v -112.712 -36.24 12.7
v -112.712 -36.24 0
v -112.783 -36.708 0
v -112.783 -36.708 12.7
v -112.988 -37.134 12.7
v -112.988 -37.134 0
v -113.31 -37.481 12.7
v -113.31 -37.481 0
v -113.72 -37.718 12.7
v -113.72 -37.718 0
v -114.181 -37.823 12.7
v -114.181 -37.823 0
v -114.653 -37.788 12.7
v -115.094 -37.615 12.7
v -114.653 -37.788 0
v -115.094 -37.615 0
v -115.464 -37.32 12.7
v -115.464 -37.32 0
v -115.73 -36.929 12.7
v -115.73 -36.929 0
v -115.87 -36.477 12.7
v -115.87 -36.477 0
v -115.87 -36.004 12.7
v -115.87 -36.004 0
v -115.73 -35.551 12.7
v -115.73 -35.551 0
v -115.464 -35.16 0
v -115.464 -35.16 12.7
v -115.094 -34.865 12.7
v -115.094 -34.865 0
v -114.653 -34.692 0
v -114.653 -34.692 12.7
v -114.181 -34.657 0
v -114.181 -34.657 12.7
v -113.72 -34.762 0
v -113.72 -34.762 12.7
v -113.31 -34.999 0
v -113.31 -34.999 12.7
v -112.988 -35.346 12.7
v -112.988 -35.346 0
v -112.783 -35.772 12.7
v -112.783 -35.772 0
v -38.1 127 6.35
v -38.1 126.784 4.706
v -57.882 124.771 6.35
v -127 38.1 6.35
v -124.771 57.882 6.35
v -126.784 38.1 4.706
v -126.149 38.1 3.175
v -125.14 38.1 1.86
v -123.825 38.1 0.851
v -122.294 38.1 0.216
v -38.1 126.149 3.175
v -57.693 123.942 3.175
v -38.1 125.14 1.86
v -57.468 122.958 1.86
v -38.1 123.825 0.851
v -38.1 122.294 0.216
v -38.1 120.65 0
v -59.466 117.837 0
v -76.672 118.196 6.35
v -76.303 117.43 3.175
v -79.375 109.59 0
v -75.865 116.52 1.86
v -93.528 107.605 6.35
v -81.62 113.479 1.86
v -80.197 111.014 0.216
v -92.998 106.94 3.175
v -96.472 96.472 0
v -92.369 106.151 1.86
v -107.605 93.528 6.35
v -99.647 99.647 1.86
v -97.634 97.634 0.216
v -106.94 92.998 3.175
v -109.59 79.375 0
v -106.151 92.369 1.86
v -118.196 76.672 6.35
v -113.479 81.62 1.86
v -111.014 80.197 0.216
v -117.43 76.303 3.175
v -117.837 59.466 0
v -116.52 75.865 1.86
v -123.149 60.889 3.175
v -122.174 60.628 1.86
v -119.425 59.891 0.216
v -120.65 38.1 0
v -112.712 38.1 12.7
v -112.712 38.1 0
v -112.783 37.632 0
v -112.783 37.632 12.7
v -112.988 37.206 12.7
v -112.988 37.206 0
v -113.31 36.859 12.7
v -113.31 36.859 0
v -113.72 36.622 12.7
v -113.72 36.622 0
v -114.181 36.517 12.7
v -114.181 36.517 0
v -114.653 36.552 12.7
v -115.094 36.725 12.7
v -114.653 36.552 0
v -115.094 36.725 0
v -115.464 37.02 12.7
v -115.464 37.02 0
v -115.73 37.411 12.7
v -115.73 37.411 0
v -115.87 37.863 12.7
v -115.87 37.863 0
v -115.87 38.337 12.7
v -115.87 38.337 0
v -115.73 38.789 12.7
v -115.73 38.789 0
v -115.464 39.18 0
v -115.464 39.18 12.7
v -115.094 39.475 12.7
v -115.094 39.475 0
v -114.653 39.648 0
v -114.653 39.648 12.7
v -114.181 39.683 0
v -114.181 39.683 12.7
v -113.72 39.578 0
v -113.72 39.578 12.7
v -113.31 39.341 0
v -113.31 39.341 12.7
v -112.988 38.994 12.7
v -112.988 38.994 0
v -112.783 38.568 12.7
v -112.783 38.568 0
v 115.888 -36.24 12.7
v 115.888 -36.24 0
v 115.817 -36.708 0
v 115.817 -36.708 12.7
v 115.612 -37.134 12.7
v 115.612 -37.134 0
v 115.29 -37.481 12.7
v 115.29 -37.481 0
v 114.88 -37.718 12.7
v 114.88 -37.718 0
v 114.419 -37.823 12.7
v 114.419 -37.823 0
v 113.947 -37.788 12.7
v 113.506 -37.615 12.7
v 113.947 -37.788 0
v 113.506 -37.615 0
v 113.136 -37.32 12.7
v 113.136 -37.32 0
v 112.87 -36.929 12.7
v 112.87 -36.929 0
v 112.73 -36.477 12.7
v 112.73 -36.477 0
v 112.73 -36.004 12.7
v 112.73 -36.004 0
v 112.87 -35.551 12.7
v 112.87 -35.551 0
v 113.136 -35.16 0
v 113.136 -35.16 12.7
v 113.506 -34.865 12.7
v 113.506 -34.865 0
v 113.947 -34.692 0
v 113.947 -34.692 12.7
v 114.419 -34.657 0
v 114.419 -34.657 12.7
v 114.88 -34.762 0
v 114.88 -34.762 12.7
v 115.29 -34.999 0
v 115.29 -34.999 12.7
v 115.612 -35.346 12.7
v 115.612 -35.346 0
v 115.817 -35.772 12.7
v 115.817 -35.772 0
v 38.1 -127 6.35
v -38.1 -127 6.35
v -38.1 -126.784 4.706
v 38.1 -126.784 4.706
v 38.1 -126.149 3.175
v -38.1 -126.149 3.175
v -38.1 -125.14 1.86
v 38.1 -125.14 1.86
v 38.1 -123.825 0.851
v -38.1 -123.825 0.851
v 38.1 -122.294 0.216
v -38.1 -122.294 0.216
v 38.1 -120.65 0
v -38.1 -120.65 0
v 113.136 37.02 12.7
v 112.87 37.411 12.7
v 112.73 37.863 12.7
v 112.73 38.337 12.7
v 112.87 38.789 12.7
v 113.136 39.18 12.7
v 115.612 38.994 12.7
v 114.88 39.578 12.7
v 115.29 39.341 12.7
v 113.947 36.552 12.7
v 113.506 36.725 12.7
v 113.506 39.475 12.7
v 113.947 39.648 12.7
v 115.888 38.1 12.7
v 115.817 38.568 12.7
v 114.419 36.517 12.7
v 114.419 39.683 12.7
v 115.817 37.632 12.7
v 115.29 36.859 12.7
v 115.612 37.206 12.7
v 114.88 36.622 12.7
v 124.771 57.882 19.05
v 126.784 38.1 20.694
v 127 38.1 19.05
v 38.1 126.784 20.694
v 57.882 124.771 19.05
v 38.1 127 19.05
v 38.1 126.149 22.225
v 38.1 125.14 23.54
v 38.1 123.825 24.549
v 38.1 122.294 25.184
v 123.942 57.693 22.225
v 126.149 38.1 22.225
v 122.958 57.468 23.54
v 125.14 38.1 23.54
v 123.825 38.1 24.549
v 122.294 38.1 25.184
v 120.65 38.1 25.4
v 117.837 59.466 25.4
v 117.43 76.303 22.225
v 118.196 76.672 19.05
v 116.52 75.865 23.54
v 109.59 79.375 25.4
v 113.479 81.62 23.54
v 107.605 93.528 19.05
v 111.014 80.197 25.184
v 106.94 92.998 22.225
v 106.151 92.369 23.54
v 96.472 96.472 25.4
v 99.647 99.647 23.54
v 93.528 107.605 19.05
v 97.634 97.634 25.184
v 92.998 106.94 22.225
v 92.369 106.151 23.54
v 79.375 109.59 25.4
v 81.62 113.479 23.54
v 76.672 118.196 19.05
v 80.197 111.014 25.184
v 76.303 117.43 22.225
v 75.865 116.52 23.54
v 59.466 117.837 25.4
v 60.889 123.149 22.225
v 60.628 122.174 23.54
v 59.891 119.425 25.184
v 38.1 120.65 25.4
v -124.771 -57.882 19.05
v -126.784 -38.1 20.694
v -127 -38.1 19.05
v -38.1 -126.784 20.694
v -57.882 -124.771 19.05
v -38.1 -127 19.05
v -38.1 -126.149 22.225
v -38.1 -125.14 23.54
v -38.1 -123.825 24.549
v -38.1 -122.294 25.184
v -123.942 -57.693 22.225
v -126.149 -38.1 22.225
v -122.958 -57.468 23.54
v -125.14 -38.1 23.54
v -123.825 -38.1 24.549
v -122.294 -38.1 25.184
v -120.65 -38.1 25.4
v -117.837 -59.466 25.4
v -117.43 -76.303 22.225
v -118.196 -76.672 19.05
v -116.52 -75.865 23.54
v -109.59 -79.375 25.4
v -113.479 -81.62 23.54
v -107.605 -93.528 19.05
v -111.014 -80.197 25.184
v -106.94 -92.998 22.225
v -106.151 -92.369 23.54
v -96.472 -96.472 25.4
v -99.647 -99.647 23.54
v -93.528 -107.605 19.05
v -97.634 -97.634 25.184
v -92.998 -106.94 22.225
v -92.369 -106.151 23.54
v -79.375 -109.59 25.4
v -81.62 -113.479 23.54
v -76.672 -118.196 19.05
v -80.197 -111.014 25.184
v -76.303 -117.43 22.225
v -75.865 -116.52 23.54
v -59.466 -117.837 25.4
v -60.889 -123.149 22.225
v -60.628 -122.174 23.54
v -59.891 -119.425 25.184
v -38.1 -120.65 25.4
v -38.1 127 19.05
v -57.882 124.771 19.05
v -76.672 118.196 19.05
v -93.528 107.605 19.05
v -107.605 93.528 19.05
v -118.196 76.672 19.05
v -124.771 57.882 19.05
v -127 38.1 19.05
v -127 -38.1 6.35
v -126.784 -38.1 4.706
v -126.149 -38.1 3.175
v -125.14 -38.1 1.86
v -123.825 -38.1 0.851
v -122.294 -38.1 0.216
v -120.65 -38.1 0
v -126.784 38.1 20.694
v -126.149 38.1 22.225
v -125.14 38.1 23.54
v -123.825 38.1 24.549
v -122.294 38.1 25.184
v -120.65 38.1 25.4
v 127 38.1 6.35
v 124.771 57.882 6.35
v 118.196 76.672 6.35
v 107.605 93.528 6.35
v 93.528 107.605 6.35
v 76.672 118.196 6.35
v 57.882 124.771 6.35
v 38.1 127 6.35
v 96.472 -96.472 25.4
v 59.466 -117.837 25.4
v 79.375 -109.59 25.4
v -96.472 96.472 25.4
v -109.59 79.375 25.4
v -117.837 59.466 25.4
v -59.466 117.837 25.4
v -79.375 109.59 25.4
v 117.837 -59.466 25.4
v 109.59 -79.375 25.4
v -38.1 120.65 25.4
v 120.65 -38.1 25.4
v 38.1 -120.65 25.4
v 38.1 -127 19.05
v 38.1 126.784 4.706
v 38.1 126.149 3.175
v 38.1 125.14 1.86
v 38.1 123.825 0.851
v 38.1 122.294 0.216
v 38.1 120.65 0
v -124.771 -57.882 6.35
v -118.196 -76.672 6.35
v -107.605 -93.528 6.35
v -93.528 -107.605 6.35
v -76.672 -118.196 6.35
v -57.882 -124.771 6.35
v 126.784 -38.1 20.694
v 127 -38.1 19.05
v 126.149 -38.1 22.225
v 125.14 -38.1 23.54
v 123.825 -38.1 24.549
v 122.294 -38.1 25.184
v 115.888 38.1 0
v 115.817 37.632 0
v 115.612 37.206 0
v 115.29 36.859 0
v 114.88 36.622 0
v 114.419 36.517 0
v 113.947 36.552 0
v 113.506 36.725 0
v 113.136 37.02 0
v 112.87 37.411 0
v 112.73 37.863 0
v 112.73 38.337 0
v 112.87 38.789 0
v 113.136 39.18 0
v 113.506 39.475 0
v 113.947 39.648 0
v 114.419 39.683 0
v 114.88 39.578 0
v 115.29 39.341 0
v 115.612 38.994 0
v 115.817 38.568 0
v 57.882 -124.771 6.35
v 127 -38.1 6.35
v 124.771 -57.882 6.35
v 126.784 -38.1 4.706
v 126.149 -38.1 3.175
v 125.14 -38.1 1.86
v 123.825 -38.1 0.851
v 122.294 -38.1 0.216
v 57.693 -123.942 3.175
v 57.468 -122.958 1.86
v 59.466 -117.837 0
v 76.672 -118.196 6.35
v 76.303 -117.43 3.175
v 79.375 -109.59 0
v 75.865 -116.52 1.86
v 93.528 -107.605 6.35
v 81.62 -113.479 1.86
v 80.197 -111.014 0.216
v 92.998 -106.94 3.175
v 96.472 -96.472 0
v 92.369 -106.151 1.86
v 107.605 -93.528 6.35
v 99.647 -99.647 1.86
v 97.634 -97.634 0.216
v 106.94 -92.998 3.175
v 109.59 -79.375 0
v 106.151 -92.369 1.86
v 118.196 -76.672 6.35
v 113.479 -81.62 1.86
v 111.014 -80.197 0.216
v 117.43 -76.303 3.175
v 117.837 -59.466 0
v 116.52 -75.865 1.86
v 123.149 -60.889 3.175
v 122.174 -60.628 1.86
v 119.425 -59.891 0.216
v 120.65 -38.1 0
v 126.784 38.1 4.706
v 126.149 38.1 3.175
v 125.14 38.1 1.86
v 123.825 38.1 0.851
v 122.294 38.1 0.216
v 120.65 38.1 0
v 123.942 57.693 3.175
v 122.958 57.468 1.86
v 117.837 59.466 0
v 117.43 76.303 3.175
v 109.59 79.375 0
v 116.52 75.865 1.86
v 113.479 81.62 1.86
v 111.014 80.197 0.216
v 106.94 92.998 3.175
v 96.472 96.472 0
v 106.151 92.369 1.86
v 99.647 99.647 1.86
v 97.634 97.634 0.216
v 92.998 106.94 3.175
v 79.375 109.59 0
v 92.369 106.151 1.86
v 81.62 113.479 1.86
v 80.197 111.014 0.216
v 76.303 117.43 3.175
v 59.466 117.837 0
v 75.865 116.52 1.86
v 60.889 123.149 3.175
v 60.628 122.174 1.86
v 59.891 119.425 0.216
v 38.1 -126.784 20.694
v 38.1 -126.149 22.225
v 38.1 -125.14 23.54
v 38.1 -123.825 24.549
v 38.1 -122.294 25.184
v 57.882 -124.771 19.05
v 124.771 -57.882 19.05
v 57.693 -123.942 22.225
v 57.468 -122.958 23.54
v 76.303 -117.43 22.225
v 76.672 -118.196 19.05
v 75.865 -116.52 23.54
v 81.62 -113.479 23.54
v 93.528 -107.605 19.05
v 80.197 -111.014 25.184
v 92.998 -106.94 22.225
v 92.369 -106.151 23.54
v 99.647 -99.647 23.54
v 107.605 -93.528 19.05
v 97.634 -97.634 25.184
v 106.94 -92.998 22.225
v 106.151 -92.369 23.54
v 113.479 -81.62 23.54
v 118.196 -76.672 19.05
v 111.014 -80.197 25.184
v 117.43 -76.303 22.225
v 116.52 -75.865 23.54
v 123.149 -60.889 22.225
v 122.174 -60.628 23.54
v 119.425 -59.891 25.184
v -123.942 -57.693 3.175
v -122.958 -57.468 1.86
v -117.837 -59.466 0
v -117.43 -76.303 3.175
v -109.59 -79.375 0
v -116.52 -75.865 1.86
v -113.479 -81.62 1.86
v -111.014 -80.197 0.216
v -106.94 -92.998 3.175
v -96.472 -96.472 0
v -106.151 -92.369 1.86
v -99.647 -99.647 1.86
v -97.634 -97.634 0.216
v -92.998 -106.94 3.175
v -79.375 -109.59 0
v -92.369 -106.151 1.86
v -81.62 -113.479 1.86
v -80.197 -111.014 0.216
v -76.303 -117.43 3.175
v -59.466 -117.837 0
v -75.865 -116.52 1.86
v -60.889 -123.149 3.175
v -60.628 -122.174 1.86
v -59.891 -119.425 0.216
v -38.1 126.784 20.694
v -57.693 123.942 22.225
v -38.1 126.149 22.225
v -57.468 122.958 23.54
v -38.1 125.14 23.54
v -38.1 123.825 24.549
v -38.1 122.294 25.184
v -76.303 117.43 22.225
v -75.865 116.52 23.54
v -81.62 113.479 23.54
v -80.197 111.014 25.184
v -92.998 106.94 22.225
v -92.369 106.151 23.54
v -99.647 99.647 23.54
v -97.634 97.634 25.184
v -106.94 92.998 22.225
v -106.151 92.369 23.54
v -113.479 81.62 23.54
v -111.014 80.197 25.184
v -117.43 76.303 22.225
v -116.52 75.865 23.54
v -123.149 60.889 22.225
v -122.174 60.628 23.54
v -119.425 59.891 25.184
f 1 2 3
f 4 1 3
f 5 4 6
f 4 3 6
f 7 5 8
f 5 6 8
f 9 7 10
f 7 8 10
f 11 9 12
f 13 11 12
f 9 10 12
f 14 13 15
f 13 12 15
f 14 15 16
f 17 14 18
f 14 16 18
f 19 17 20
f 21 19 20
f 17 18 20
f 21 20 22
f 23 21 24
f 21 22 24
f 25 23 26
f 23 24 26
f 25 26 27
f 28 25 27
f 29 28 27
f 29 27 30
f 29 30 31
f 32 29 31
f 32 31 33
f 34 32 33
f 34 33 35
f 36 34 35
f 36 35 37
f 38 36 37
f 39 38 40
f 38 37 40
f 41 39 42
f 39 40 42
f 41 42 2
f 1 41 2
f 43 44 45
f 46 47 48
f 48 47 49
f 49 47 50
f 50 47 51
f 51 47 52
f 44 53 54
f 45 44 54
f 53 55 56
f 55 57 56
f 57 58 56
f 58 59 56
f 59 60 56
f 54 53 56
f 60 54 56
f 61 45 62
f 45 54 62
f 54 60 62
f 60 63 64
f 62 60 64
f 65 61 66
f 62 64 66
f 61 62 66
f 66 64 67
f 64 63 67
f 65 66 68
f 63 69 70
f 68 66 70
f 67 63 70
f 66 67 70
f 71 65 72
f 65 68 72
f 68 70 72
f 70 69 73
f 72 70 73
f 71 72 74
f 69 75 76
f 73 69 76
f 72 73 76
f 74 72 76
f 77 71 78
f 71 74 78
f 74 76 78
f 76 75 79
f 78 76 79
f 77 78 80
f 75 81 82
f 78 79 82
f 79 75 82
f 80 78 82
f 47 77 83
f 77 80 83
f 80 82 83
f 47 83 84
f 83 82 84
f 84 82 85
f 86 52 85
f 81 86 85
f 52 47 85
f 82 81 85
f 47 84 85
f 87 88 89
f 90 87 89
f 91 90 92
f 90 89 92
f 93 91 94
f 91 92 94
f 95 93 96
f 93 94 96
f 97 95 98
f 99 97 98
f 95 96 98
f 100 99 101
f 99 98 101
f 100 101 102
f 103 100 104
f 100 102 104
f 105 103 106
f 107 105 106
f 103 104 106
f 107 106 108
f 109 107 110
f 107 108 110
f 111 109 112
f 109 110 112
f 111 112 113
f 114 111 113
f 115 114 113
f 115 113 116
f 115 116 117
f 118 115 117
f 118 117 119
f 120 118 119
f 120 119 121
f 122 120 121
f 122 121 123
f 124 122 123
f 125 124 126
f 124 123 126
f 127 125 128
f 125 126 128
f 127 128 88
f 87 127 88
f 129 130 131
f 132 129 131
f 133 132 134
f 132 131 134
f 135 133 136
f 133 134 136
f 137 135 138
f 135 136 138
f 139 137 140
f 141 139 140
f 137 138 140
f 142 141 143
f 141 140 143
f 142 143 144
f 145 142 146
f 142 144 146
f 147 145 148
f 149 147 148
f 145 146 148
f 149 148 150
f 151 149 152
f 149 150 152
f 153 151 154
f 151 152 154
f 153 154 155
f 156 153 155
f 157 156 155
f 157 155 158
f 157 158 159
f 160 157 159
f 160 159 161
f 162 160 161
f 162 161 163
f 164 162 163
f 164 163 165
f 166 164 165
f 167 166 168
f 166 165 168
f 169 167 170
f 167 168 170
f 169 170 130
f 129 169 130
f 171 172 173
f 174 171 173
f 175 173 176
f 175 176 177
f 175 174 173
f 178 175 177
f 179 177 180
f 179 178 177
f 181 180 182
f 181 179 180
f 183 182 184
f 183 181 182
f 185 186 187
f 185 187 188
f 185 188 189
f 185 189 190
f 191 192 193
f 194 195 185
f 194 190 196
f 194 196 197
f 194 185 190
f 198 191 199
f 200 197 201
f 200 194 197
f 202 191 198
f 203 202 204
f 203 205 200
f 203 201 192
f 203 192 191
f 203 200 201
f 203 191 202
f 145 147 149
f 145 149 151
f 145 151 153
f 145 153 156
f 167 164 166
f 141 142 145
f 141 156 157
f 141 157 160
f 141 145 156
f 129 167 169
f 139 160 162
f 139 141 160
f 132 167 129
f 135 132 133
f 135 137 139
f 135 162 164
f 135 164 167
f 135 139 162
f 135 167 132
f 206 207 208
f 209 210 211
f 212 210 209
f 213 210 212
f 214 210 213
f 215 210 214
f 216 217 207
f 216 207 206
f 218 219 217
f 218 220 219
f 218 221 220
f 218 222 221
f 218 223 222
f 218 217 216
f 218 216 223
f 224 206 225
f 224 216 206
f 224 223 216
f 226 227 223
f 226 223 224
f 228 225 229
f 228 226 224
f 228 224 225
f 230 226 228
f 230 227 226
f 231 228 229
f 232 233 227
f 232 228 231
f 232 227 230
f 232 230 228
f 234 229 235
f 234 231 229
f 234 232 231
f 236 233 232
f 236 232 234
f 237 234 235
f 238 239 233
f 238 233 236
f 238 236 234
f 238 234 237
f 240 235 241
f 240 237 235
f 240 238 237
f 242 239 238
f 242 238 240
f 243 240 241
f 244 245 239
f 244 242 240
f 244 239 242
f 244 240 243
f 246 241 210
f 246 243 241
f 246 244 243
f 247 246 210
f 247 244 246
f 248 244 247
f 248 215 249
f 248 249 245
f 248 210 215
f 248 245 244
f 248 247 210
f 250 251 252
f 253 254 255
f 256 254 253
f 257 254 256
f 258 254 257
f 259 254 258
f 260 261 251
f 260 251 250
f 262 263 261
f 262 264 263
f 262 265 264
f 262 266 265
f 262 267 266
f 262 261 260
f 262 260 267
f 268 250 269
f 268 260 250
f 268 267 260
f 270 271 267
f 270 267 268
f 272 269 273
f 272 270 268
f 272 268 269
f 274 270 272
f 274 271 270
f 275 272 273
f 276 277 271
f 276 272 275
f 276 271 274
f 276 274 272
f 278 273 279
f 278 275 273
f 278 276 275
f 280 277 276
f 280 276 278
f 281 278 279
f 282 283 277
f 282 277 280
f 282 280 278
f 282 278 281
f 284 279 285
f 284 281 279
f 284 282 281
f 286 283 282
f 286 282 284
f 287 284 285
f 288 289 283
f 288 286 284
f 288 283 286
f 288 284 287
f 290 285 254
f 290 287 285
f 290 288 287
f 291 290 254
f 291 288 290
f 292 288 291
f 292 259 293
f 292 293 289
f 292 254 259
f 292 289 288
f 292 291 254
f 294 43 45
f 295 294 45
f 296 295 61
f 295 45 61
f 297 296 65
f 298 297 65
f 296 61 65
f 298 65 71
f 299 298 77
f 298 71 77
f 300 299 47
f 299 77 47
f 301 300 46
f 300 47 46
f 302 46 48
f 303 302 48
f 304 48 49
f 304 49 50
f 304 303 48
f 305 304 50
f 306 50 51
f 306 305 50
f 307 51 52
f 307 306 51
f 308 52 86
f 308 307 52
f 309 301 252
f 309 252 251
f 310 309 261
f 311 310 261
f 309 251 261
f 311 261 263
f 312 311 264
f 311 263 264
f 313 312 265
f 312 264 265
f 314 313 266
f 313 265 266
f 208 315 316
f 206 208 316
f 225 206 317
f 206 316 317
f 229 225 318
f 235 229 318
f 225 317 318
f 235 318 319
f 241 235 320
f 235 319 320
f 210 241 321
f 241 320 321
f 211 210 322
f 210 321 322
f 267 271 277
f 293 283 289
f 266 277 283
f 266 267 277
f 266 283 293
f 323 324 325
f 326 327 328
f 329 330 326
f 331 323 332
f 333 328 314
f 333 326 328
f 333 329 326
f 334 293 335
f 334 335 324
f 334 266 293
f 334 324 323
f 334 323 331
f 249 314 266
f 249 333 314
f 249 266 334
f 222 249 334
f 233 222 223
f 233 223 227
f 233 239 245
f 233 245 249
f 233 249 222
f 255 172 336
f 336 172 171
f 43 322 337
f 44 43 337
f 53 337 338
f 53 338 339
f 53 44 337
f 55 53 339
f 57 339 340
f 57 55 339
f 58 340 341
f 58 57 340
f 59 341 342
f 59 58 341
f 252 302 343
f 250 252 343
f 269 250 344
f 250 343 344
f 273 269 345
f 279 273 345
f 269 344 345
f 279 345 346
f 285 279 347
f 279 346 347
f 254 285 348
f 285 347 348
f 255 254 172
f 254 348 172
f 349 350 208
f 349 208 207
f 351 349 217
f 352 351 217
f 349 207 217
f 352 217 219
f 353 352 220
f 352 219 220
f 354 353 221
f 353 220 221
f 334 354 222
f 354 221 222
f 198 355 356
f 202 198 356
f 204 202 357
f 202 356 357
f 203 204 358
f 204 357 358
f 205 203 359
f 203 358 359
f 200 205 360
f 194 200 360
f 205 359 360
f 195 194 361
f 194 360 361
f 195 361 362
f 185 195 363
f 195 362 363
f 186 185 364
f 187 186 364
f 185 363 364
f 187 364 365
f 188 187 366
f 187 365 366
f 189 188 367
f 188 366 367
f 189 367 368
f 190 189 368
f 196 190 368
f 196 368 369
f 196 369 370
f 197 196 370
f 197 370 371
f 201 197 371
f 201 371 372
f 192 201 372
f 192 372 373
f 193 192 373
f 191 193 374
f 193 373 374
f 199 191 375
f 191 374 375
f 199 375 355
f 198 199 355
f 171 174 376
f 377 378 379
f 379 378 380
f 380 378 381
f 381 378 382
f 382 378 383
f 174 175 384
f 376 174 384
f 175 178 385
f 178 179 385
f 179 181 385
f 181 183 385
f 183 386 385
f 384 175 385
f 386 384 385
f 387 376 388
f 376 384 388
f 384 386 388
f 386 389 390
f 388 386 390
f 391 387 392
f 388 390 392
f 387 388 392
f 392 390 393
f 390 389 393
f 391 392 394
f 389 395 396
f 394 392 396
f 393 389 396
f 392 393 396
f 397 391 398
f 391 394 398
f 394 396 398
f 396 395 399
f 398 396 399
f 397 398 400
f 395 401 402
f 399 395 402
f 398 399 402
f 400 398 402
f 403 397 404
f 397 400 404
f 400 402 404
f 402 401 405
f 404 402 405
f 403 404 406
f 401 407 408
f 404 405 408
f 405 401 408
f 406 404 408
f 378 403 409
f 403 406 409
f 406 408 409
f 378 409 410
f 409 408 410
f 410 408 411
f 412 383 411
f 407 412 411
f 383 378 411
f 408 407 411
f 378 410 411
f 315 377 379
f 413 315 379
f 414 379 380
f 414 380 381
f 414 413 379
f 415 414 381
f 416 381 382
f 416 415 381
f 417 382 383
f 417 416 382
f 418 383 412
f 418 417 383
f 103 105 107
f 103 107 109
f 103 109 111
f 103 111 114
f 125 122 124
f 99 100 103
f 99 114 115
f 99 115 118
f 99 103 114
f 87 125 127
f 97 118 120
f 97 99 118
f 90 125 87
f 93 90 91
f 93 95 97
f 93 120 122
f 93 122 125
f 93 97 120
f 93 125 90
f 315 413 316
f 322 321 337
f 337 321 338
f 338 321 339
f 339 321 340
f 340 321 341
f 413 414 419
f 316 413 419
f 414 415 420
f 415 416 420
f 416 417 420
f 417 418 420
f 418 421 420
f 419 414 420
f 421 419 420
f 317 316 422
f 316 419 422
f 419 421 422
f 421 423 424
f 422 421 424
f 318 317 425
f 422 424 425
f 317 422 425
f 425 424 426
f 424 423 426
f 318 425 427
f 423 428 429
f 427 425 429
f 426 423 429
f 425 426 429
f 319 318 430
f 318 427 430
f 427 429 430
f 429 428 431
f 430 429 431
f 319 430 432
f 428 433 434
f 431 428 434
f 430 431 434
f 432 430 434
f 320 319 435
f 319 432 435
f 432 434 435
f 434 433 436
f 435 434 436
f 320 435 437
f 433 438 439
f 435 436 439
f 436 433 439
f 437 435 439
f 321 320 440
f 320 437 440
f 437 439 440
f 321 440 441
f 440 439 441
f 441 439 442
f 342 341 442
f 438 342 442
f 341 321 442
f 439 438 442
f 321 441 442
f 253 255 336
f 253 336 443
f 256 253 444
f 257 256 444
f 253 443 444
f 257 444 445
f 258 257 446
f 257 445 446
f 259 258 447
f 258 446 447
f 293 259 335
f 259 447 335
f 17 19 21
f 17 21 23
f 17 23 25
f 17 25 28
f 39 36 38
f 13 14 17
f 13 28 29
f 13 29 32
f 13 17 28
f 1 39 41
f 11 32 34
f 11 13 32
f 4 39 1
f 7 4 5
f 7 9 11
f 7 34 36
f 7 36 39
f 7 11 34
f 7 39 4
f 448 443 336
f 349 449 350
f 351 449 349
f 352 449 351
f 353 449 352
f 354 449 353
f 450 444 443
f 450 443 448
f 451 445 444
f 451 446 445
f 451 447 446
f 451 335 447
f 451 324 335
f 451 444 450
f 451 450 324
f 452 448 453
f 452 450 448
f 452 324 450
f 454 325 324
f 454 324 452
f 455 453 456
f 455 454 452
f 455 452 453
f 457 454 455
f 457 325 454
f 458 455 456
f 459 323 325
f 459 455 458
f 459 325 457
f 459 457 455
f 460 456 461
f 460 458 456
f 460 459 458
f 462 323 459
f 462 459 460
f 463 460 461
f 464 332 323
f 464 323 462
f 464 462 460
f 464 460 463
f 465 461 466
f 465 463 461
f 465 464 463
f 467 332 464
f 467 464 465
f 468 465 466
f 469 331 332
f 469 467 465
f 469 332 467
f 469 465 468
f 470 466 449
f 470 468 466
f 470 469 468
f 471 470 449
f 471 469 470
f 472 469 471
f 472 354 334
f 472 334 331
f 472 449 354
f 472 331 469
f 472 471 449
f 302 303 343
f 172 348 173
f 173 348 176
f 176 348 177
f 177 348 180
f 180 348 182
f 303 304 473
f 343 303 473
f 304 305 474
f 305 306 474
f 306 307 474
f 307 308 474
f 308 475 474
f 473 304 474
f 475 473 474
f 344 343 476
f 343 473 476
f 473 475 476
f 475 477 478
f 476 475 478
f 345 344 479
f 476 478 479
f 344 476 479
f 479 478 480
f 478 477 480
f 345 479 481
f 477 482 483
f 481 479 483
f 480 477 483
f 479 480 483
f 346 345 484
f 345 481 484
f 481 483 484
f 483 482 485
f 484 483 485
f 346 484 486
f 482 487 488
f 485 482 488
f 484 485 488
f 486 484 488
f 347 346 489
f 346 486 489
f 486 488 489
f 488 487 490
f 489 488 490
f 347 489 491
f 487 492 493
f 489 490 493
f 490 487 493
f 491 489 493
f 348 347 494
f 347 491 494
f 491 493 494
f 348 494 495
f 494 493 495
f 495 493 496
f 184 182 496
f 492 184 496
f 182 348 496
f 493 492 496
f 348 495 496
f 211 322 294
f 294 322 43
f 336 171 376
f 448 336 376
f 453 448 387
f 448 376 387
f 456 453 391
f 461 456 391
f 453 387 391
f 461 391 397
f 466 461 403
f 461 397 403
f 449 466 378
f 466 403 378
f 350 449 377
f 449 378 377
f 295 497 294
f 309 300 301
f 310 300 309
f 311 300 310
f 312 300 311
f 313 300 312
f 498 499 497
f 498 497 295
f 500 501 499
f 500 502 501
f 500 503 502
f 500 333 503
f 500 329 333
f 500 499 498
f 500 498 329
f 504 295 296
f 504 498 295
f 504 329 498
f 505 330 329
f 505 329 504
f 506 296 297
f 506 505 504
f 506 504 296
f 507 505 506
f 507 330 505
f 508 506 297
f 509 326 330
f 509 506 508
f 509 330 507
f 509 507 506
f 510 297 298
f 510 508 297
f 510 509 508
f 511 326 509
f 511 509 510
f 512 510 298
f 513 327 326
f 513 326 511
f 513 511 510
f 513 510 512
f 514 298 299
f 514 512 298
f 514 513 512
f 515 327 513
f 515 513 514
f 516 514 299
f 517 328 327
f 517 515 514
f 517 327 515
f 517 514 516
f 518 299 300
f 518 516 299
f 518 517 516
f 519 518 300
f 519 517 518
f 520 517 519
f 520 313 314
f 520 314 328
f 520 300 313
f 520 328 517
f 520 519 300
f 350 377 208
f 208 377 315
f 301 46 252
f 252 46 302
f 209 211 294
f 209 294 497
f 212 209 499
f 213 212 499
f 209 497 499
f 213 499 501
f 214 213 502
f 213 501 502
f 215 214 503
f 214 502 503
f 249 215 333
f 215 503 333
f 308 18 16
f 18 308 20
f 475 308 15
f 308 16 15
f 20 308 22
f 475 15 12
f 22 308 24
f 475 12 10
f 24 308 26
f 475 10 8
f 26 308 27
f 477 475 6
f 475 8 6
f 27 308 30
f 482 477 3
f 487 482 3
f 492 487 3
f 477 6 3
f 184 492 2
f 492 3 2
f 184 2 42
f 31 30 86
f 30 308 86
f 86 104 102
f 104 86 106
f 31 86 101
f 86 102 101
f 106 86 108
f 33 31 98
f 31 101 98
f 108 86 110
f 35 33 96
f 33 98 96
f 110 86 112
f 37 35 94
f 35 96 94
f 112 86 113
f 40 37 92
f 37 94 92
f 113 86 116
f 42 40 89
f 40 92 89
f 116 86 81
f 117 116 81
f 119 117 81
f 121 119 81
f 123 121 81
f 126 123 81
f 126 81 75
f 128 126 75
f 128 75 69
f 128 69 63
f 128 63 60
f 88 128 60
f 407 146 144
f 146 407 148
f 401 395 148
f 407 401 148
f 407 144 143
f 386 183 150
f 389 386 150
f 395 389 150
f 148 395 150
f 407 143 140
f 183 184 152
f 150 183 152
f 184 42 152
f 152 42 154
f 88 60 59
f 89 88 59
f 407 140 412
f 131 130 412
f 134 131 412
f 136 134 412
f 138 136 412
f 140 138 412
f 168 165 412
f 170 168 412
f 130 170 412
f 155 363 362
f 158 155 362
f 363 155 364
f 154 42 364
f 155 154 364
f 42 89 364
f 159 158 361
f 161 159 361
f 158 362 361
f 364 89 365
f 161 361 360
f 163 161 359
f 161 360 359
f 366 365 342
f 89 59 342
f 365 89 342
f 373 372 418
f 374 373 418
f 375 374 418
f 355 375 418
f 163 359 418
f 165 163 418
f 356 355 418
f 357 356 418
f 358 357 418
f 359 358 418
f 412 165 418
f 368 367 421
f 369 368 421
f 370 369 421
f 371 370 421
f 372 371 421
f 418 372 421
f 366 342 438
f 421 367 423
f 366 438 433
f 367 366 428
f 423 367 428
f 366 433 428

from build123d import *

# Parameters (mm, degrees)
F1_DEPTH = 25.4
F2_R     = 6.35
F3_R     = 1.5875
F4_DEPTH = 12.7


with BuildPart() as f1:
    # F0 (on Top) → F1 (new body)
    with BuildSketch(Plane.XY):
        with BuildLine():
            ThreePointArc((127, 38.1), (100.961793, 100.961793), (38.1, 127))
            Line((38.1, 127), (-38.1, 127))
            ThreePointArc((-38.1, 127), (-100.961793, 100.961793), (-127, 38.1))
            Line((-127, 38.1), (-127, -38.1))
            ThreePointArc((-127, -38.1), (-100.961793, -100.961793), (-38.1, -127))
            Line((-38.1, -127), (38.1, -127))
            ThreePointArc((38.1, -127), (100.961793, -100.961793), (127, -38.1))
            Line((127, -38.1), (127, 38.1))
        make_face()
    extrude(amount=F1_DEPTH)

    # F2
    f2_edges = [f1.edges().sort_by_distance(p)[0] for p in [
        (-100.961793, -100.961793, 25.4),
        (-100.961793, -100.961793, 0),
    ]]
    fillet(f2_edges, radius=F2_R)

    # F3 (on face) → F4 (cut)
    with BuildSketch(Plane(origin=(0, 0, 0), x_dir=(1, 0, 0), z_dir=(0, 0, -1))):
        with Locations((-114.3, 36.240128)):
            Circle(F3_R)
        with Locations((114.3, 36.240128)):
            Circle(F3_R)
        with Locations((114.3, -38.1)):
            Circle(F3_R)
        with Locations((-114.3, -38.1)):
            Circle(F3_R)
    extrude(amount=-F4_DEPTH, mode=Mode.SUBTRACT)


solid = f1.part
